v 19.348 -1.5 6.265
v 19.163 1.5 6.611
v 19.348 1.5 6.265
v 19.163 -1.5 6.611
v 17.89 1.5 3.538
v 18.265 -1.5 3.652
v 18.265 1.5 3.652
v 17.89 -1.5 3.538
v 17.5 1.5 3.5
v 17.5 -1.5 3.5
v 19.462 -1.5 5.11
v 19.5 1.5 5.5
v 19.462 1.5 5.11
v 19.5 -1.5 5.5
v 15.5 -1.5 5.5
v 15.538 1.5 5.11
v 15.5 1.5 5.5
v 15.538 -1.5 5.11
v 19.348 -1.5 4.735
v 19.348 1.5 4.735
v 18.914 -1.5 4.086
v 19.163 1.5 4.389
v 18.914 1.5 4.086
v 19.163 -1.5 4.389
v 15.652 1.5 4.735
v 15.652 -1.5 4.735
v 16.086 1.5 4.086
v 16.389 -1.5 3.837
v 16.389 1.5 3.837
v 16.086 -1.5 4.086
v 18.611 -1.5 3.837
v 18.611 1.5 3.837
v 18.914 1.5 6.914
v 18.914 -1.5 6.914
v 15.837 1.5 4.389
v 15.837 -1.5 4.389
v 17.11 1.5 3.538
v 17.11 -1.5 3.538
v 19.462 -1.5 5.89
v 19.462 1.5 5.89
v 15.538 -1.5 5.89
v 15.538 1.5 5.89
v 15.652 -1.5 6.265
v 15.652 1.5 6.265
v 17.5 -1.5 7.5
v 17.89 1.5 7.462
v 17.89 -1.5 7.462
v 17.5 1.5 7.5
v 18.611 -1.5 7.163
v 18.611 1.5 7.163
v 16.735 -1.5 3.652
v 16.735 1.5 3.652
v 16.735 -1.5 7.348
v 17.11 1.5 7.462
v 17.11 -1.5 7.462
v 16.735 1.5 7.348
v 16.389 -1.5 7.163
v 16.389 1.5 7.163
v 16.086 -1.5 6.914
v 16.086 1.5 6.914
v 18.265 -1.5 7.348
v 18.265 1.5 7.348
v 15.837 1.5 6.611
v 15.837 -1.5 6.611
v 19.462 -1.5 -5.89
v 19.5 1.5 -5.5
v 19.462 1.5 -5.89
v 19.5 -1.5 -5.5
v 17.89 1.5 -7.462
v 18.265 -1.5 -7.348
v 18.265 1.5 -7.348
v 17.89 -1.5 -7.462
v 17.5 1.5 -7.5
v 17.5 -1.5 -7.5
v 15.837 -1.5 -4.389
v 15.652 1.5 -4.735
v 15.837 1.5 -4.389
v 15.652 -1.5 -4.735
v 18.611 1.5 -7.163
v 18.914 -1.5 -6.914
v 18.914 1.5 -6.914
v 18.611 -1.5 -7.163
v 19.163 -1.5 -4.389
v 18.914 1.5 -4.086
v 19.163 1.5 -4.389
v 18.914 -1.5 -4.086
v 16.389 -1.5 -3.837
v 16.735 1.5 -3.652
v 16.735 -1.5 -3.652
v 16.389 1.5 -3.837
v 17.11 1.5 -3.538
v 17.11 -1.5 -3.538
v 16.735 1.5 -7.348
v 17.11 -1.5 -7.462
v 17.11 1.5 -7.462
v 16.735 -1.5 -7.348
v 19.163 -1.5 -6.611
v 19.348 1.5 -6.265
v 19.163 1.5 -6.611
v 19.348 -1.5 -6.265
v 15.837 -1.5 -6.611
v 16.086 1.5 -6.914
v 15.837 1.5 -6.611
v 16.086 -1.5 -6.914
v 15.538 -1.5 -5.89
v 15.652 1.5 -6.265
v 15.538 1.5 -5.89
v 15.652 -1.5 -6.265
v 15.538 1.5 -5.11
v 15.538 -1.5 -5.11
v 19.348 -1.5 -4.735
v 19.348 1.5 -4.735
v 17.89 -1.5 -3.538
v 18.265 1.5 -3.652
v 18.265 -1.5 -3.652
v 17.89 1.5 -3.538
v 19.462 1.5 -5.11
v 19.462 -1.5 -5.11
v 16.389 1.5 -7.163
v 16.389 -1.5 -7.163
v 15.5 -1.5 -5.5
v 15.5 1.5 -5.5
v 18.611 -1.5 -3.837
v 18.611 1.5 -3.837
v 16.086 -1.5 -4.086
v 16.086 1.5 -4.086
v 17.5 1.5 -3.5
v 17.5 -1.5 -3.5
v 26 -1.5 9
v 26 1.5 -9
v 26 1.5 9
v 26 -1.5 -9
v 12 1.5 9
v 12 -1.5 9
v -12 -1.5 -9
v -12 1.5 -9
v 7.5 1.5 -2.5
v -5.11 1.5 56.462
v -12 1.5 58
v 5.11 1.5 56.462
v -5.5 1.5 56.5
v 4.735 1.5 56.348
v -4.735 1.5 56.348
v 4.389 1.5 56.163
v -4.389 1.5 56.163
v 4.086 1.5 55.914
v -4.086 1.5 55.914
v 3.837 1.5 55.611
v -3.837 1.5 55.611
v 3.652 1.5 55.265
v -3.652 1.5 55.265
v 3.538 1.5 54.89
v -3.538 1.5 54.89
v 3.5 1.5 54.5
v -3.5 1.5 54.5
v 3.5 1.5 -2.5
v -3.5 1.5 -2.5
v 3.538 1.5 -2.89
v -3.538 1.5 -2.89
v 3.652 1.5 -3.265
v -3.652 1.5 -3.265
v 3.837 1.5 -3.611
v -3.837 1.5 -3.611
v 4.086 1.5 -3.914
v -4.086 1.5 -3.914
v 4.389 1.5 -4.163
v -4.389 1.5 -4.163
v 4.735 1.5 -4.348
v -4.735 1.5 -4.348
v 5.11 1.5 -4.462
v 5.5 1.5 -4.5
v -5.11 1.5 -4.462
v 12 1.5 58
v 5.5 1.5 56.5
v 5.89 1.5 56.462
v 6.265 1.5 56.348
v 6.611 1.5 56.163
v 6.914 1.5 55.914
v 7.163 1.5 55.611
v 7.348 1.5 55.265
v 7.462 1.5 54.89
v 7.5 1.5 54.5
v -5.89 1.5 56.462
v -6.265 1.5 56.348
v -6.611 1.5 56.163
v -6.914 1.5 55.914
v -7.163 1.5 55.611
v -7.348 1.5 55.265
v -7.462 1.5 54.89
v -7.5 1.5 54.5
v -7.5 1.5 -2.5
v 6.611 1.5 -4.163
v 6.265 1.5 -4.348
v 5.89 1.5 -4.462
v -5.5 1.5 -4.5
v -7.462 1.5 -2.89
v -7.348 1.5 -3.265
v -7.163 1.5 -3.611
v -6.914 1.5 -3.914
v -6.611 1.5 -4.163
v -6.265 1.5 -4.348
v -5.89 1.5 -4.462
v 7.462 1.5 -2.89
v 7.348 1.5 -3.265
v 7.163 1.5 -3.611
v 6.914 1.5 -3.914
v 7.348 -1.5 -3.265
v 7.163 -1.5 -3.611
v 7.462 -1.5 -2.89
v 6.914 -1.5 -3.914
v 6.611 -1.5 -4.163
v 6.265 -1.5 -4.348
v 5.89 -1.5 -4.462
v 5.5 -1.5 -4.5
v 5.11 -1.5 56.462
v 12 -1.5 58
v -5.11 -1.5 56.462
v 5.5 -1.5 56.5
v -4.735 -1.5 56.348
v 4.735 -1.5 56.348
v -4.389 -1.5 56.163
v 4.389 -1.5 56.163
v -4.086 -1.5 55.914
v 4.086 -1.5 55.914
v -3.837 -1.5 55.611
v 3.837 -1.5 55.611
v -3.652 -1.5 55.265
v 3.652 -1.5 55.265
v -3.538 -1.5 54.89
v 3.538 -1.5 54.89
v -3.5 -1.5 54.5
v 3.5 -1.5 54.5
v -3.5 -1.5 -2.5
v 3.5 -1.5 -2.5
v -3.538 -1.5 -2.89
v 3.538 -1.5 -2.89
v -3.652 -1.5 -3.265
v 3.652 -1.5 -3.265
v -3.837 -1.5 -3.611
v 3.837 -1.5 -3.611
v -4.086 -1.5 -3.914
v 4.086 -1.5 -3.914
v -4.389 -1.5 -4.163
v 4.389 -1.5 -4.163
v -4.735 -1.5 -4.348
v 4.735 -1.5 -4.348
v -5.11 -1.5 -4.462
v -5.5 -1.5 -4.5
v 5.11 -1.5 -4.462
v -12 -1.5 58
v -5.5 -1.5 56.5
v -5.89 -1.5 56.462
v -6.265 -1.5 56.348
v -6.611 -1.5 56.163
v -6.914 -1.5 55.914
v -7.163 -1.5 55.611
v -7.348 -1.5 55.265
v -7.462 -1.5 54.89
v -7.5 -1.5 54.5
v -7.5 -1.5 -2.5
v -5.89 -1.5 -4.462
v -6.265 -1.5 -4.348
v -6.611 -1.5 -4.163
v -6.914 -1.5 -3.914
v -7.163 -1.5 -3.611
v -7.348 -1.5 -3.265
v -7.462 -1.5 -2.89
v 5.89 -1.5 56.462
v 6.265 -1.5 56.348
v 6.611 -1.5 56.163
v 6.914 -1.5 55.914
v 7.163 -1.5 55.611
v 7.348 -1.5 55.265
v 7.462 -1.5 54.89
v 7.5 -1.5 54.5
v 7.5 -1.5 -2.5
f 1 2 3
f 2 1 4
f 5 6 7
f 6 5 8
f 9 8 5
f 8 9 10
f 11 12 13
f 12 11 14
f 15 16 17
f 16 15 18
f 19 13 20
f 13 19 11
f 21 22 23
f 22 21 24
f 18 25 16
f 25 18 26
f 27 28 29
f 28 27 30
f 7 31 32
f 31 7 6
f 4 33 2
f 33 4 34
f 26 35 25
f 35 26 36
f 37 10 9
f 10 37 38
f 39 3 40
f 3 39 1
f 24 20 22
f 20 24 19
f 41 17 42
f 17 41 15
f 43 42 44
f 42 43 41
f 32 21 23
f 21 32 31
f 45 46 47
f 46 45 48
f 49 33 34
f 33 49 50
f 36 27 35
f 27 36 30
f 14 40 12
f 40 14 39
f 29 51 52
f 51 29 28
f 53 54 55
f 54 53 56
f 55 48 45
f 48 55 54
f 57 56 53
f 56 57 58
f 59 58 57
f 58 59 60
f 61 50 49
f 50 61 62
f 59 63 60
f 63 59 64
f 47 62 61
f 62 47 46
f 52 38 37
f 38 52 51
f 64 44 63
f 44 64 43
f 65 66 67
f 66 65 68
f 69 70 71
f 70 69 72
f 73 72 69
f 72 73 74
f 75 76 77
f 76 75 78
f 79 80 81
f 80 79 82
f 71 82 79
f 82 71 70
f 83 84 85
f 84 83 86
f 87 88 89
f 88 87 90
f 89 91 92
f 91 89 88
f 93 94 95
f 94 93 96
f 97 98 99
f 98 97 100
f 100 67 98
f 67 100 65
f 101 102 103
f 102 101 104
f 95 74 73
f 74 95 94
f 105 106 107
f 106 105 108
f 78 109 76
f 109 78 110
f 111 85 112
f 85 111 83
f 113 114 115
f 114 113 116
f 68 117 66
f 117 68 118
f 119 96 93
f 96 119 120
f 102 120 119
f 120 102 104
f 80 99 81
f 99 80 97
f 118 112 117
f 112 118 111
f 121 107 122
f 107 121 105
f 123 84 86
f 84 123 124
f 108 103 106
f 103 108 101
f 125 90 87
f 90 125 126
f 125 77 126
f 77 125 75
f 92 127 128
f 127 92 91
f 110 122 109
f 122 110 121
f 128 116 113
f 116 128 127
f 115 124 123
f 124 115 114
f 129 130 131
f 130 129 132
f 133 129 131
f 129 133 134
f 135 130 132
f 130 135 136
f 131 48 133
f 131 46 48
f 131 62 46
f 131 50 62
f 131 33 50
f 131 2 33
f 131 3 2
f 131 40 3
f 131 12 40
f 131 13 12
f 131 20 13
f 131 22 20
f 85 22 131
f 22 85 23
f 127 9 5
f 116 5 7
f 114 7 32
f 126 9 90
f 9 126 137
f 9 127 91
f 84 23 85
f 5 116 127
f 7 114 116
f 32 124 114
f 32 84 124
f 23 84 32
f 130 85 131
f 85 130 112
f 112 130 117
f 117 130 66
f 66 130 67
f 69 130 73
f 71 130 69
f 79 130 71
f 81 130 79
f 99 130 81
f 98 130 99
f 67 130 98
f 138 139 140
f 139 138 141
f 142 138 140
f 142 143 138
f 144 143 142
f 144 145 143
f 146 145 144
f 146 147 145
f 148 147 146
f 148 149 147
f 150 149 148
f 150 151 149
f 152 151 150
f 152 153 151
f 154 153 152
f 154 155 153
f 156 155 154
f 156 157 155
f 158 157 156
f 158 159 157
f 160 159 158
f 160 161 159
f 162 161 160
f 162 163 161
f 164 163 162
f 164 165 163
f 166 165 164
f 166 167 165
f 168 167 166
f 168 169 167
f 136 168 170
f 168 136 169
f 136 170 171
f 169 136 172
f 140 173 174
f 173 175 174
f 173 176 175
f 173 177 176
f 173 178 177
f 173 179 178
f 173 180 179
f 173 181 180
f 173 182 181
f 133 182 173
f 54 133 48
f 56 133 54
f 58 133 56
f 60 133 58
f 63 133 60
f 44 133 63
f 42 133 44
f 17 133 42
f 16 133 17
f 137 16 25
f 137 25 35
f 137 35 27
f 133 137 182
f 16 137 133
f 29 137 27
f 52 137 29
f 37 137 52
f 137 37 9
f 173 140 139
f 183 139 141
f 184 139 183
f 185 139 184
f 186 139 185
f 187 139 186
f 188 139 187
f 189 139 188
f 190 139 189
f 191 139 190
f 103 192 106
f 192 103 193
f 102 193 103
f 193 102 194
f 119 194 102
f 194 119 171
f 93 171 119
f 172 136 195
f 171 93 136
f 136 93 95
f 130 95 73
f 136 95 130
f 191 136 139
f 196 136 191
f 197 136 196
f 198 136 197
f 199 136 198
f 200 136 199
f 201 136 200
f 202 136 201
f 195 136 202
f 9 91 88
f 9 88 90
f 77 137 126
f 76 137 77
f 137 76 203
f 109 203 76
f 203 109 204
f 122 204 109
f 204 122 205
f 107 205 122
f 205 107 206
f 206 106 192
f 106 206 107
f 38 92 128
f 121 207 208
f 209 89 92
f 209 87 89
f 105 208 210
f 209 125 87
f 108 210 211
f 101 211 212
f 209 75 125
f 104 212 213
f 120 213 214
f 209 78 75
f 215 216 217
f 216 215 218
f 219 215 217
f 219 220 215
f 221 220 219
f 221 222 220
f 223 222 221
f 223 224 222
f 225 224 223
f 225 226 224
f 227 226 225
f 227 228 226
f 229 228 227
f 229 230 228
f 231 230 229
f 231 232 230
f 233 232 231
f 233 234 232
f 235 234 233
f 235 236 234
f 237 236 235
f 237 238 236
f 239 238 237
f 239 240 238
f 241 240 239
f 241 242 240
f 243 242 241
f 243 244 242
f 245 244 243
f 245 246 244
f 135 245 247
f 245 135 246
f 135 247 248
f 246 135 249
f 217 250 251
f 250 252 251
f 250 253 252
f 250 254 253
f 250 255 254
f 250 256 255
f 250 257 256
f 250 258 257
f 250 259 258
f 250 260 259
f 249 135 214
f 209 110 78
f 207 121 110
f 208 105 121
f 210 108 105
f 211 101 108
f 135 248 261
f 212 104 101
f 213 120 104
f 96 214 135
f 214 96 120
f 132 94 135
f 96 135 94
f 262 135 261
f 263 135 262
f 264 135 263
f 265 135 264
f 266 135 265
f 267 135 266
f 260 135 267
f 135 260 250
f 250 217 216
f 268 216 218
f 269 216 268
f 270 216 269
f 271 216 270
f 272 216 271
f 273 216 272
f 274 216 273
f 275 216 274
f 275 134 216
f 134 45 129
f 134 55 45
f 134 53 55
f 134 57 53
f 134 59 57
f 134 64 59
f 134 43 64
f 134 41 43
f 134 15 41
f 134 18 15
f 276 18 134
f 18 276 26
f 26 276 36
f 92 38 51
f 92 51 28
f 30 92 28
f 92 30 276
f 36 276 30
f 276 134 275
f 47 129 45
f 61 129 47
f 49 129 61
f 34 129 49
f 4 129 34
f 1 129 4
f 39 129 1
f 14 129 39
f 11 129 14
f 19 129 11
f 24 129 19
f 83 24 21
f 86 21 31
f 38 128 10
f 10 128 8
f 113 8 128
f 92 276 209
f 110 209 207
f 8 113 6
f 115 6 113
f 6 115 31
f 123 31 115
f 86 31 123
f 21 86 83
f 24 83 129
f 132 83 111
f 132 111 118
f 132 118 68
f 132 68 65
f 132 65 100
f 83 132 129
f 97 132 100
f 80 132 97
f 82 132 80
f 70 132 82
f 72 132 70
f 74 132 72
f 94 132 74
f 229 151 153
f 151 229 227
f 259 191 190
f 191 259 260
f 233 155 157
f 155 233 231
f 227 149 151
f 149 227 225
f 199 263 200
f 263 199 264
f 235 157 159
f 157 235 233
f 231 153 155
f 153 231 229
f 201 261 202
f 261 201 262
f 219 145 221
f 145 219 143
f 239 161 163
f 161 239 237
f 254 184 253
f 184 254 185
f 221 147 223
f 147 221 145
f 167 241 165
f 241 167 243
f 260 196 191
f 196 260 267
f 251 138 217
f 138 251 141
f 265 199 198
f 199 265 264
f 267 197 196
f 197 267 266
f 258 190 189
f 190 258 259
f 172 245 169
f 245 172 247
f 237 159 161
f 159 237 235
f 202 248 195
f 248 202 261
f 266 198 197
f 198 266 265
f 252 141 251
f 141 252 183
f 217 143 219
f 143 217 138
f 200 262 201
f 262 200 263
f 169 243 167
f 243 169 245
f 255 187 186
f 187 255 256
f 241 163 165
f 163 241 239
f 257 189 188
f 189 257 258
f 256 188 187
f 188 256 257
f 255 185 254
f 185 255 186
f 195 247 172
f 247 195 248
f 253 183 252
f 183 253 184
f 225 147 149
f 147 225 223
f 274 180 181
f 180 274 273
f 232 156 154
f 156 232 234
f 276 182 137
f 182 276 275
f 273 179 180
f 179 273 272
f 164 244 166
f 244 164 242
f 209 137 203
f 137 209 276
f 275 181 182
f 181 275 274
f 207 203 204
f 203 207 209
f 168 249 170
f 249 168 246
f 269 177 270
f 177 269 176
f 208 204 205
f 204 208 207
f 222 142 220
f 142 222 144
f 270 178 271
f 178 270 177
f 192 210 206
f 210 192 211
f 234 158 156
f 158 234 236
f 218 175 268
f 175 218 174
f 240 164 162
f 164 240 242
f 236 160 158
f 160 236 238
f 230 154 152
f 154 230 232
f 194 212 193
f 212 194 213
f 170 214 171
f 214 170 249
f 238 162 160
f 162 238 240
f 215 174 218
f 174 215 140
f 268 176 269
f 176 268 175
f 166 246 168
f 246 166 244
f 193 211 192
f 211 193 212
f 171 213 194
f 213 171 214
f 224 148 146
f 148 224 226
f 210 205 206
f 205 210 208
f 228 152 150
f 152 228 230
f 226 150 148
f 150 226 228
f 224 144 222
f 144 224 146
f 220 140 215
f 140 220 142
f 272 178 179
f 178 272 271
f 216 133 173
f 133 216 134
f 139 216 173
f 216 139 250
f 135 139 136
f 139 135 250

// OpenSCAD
$fa = 1;
$fs = 0.4;

fudge = 0.01;
wall = 3;


frame_screw_distance = 11;
frame_screw_hole_d = 4;
frame_width = max(17, frame_screw_hole_d + wall); // 2020 frame is 20mm wide
frame_height = frame_screw_distance + frame_screw_hole_d + wall;

switch_screw_distance = 11;
switch_screw_hole_d = 4;
switch_width = max(17, switch_screw_distance + switch_screw_hole_d + wall);
switch_height = 67; // total outside, screw guides will be smaller
switch_extra_width = wall*2; // for support
switch_screw_offset_bottom = wall;

switch_screw_guide_length = switch_height - wall - switch_screw_hole_d - switch_screw_offset_bottom;


union() {
    // frame
    translate([switch_width/2 + frame_width/2, 0, 0])
    difference() {
        cube([frame_width, wall, frame_height], center=true);
        
        screw_holes(frame_screw_distance, frame_screw_hole_d, vertical=true);
    }


    // vert
    translate([0, 0, switch_height/2 - frame_height/2])    
    difference() {
        cube([switch_width + switch_extra_width, wall, switch_height], center=true);
        
        for (v = [-1:2:1]) {
            translate([(switch_screw_distance / 2) * v, 0, switch_screw_offset_bottom/2])
            hull()
            screw_holes(switch_screw_guide_length, switch_screw_hole_d, vertical=true);
        }
    }
    
}

module screw_holes(distance, diameter, vertical=true) {
    //translate([0, 0, (switch_height/2) - (switch_screw_hole_d/2) - (wall/2)])
    rotate(vertical ? 90 : 0, [0, 1, 0])
    for (s = [-2:4:2]) {
        translate([distance/s, 0, 0])
        rotate([90, 0, 0])
        cylinder(wall*4, d=diameter, center=true);
    }
}
